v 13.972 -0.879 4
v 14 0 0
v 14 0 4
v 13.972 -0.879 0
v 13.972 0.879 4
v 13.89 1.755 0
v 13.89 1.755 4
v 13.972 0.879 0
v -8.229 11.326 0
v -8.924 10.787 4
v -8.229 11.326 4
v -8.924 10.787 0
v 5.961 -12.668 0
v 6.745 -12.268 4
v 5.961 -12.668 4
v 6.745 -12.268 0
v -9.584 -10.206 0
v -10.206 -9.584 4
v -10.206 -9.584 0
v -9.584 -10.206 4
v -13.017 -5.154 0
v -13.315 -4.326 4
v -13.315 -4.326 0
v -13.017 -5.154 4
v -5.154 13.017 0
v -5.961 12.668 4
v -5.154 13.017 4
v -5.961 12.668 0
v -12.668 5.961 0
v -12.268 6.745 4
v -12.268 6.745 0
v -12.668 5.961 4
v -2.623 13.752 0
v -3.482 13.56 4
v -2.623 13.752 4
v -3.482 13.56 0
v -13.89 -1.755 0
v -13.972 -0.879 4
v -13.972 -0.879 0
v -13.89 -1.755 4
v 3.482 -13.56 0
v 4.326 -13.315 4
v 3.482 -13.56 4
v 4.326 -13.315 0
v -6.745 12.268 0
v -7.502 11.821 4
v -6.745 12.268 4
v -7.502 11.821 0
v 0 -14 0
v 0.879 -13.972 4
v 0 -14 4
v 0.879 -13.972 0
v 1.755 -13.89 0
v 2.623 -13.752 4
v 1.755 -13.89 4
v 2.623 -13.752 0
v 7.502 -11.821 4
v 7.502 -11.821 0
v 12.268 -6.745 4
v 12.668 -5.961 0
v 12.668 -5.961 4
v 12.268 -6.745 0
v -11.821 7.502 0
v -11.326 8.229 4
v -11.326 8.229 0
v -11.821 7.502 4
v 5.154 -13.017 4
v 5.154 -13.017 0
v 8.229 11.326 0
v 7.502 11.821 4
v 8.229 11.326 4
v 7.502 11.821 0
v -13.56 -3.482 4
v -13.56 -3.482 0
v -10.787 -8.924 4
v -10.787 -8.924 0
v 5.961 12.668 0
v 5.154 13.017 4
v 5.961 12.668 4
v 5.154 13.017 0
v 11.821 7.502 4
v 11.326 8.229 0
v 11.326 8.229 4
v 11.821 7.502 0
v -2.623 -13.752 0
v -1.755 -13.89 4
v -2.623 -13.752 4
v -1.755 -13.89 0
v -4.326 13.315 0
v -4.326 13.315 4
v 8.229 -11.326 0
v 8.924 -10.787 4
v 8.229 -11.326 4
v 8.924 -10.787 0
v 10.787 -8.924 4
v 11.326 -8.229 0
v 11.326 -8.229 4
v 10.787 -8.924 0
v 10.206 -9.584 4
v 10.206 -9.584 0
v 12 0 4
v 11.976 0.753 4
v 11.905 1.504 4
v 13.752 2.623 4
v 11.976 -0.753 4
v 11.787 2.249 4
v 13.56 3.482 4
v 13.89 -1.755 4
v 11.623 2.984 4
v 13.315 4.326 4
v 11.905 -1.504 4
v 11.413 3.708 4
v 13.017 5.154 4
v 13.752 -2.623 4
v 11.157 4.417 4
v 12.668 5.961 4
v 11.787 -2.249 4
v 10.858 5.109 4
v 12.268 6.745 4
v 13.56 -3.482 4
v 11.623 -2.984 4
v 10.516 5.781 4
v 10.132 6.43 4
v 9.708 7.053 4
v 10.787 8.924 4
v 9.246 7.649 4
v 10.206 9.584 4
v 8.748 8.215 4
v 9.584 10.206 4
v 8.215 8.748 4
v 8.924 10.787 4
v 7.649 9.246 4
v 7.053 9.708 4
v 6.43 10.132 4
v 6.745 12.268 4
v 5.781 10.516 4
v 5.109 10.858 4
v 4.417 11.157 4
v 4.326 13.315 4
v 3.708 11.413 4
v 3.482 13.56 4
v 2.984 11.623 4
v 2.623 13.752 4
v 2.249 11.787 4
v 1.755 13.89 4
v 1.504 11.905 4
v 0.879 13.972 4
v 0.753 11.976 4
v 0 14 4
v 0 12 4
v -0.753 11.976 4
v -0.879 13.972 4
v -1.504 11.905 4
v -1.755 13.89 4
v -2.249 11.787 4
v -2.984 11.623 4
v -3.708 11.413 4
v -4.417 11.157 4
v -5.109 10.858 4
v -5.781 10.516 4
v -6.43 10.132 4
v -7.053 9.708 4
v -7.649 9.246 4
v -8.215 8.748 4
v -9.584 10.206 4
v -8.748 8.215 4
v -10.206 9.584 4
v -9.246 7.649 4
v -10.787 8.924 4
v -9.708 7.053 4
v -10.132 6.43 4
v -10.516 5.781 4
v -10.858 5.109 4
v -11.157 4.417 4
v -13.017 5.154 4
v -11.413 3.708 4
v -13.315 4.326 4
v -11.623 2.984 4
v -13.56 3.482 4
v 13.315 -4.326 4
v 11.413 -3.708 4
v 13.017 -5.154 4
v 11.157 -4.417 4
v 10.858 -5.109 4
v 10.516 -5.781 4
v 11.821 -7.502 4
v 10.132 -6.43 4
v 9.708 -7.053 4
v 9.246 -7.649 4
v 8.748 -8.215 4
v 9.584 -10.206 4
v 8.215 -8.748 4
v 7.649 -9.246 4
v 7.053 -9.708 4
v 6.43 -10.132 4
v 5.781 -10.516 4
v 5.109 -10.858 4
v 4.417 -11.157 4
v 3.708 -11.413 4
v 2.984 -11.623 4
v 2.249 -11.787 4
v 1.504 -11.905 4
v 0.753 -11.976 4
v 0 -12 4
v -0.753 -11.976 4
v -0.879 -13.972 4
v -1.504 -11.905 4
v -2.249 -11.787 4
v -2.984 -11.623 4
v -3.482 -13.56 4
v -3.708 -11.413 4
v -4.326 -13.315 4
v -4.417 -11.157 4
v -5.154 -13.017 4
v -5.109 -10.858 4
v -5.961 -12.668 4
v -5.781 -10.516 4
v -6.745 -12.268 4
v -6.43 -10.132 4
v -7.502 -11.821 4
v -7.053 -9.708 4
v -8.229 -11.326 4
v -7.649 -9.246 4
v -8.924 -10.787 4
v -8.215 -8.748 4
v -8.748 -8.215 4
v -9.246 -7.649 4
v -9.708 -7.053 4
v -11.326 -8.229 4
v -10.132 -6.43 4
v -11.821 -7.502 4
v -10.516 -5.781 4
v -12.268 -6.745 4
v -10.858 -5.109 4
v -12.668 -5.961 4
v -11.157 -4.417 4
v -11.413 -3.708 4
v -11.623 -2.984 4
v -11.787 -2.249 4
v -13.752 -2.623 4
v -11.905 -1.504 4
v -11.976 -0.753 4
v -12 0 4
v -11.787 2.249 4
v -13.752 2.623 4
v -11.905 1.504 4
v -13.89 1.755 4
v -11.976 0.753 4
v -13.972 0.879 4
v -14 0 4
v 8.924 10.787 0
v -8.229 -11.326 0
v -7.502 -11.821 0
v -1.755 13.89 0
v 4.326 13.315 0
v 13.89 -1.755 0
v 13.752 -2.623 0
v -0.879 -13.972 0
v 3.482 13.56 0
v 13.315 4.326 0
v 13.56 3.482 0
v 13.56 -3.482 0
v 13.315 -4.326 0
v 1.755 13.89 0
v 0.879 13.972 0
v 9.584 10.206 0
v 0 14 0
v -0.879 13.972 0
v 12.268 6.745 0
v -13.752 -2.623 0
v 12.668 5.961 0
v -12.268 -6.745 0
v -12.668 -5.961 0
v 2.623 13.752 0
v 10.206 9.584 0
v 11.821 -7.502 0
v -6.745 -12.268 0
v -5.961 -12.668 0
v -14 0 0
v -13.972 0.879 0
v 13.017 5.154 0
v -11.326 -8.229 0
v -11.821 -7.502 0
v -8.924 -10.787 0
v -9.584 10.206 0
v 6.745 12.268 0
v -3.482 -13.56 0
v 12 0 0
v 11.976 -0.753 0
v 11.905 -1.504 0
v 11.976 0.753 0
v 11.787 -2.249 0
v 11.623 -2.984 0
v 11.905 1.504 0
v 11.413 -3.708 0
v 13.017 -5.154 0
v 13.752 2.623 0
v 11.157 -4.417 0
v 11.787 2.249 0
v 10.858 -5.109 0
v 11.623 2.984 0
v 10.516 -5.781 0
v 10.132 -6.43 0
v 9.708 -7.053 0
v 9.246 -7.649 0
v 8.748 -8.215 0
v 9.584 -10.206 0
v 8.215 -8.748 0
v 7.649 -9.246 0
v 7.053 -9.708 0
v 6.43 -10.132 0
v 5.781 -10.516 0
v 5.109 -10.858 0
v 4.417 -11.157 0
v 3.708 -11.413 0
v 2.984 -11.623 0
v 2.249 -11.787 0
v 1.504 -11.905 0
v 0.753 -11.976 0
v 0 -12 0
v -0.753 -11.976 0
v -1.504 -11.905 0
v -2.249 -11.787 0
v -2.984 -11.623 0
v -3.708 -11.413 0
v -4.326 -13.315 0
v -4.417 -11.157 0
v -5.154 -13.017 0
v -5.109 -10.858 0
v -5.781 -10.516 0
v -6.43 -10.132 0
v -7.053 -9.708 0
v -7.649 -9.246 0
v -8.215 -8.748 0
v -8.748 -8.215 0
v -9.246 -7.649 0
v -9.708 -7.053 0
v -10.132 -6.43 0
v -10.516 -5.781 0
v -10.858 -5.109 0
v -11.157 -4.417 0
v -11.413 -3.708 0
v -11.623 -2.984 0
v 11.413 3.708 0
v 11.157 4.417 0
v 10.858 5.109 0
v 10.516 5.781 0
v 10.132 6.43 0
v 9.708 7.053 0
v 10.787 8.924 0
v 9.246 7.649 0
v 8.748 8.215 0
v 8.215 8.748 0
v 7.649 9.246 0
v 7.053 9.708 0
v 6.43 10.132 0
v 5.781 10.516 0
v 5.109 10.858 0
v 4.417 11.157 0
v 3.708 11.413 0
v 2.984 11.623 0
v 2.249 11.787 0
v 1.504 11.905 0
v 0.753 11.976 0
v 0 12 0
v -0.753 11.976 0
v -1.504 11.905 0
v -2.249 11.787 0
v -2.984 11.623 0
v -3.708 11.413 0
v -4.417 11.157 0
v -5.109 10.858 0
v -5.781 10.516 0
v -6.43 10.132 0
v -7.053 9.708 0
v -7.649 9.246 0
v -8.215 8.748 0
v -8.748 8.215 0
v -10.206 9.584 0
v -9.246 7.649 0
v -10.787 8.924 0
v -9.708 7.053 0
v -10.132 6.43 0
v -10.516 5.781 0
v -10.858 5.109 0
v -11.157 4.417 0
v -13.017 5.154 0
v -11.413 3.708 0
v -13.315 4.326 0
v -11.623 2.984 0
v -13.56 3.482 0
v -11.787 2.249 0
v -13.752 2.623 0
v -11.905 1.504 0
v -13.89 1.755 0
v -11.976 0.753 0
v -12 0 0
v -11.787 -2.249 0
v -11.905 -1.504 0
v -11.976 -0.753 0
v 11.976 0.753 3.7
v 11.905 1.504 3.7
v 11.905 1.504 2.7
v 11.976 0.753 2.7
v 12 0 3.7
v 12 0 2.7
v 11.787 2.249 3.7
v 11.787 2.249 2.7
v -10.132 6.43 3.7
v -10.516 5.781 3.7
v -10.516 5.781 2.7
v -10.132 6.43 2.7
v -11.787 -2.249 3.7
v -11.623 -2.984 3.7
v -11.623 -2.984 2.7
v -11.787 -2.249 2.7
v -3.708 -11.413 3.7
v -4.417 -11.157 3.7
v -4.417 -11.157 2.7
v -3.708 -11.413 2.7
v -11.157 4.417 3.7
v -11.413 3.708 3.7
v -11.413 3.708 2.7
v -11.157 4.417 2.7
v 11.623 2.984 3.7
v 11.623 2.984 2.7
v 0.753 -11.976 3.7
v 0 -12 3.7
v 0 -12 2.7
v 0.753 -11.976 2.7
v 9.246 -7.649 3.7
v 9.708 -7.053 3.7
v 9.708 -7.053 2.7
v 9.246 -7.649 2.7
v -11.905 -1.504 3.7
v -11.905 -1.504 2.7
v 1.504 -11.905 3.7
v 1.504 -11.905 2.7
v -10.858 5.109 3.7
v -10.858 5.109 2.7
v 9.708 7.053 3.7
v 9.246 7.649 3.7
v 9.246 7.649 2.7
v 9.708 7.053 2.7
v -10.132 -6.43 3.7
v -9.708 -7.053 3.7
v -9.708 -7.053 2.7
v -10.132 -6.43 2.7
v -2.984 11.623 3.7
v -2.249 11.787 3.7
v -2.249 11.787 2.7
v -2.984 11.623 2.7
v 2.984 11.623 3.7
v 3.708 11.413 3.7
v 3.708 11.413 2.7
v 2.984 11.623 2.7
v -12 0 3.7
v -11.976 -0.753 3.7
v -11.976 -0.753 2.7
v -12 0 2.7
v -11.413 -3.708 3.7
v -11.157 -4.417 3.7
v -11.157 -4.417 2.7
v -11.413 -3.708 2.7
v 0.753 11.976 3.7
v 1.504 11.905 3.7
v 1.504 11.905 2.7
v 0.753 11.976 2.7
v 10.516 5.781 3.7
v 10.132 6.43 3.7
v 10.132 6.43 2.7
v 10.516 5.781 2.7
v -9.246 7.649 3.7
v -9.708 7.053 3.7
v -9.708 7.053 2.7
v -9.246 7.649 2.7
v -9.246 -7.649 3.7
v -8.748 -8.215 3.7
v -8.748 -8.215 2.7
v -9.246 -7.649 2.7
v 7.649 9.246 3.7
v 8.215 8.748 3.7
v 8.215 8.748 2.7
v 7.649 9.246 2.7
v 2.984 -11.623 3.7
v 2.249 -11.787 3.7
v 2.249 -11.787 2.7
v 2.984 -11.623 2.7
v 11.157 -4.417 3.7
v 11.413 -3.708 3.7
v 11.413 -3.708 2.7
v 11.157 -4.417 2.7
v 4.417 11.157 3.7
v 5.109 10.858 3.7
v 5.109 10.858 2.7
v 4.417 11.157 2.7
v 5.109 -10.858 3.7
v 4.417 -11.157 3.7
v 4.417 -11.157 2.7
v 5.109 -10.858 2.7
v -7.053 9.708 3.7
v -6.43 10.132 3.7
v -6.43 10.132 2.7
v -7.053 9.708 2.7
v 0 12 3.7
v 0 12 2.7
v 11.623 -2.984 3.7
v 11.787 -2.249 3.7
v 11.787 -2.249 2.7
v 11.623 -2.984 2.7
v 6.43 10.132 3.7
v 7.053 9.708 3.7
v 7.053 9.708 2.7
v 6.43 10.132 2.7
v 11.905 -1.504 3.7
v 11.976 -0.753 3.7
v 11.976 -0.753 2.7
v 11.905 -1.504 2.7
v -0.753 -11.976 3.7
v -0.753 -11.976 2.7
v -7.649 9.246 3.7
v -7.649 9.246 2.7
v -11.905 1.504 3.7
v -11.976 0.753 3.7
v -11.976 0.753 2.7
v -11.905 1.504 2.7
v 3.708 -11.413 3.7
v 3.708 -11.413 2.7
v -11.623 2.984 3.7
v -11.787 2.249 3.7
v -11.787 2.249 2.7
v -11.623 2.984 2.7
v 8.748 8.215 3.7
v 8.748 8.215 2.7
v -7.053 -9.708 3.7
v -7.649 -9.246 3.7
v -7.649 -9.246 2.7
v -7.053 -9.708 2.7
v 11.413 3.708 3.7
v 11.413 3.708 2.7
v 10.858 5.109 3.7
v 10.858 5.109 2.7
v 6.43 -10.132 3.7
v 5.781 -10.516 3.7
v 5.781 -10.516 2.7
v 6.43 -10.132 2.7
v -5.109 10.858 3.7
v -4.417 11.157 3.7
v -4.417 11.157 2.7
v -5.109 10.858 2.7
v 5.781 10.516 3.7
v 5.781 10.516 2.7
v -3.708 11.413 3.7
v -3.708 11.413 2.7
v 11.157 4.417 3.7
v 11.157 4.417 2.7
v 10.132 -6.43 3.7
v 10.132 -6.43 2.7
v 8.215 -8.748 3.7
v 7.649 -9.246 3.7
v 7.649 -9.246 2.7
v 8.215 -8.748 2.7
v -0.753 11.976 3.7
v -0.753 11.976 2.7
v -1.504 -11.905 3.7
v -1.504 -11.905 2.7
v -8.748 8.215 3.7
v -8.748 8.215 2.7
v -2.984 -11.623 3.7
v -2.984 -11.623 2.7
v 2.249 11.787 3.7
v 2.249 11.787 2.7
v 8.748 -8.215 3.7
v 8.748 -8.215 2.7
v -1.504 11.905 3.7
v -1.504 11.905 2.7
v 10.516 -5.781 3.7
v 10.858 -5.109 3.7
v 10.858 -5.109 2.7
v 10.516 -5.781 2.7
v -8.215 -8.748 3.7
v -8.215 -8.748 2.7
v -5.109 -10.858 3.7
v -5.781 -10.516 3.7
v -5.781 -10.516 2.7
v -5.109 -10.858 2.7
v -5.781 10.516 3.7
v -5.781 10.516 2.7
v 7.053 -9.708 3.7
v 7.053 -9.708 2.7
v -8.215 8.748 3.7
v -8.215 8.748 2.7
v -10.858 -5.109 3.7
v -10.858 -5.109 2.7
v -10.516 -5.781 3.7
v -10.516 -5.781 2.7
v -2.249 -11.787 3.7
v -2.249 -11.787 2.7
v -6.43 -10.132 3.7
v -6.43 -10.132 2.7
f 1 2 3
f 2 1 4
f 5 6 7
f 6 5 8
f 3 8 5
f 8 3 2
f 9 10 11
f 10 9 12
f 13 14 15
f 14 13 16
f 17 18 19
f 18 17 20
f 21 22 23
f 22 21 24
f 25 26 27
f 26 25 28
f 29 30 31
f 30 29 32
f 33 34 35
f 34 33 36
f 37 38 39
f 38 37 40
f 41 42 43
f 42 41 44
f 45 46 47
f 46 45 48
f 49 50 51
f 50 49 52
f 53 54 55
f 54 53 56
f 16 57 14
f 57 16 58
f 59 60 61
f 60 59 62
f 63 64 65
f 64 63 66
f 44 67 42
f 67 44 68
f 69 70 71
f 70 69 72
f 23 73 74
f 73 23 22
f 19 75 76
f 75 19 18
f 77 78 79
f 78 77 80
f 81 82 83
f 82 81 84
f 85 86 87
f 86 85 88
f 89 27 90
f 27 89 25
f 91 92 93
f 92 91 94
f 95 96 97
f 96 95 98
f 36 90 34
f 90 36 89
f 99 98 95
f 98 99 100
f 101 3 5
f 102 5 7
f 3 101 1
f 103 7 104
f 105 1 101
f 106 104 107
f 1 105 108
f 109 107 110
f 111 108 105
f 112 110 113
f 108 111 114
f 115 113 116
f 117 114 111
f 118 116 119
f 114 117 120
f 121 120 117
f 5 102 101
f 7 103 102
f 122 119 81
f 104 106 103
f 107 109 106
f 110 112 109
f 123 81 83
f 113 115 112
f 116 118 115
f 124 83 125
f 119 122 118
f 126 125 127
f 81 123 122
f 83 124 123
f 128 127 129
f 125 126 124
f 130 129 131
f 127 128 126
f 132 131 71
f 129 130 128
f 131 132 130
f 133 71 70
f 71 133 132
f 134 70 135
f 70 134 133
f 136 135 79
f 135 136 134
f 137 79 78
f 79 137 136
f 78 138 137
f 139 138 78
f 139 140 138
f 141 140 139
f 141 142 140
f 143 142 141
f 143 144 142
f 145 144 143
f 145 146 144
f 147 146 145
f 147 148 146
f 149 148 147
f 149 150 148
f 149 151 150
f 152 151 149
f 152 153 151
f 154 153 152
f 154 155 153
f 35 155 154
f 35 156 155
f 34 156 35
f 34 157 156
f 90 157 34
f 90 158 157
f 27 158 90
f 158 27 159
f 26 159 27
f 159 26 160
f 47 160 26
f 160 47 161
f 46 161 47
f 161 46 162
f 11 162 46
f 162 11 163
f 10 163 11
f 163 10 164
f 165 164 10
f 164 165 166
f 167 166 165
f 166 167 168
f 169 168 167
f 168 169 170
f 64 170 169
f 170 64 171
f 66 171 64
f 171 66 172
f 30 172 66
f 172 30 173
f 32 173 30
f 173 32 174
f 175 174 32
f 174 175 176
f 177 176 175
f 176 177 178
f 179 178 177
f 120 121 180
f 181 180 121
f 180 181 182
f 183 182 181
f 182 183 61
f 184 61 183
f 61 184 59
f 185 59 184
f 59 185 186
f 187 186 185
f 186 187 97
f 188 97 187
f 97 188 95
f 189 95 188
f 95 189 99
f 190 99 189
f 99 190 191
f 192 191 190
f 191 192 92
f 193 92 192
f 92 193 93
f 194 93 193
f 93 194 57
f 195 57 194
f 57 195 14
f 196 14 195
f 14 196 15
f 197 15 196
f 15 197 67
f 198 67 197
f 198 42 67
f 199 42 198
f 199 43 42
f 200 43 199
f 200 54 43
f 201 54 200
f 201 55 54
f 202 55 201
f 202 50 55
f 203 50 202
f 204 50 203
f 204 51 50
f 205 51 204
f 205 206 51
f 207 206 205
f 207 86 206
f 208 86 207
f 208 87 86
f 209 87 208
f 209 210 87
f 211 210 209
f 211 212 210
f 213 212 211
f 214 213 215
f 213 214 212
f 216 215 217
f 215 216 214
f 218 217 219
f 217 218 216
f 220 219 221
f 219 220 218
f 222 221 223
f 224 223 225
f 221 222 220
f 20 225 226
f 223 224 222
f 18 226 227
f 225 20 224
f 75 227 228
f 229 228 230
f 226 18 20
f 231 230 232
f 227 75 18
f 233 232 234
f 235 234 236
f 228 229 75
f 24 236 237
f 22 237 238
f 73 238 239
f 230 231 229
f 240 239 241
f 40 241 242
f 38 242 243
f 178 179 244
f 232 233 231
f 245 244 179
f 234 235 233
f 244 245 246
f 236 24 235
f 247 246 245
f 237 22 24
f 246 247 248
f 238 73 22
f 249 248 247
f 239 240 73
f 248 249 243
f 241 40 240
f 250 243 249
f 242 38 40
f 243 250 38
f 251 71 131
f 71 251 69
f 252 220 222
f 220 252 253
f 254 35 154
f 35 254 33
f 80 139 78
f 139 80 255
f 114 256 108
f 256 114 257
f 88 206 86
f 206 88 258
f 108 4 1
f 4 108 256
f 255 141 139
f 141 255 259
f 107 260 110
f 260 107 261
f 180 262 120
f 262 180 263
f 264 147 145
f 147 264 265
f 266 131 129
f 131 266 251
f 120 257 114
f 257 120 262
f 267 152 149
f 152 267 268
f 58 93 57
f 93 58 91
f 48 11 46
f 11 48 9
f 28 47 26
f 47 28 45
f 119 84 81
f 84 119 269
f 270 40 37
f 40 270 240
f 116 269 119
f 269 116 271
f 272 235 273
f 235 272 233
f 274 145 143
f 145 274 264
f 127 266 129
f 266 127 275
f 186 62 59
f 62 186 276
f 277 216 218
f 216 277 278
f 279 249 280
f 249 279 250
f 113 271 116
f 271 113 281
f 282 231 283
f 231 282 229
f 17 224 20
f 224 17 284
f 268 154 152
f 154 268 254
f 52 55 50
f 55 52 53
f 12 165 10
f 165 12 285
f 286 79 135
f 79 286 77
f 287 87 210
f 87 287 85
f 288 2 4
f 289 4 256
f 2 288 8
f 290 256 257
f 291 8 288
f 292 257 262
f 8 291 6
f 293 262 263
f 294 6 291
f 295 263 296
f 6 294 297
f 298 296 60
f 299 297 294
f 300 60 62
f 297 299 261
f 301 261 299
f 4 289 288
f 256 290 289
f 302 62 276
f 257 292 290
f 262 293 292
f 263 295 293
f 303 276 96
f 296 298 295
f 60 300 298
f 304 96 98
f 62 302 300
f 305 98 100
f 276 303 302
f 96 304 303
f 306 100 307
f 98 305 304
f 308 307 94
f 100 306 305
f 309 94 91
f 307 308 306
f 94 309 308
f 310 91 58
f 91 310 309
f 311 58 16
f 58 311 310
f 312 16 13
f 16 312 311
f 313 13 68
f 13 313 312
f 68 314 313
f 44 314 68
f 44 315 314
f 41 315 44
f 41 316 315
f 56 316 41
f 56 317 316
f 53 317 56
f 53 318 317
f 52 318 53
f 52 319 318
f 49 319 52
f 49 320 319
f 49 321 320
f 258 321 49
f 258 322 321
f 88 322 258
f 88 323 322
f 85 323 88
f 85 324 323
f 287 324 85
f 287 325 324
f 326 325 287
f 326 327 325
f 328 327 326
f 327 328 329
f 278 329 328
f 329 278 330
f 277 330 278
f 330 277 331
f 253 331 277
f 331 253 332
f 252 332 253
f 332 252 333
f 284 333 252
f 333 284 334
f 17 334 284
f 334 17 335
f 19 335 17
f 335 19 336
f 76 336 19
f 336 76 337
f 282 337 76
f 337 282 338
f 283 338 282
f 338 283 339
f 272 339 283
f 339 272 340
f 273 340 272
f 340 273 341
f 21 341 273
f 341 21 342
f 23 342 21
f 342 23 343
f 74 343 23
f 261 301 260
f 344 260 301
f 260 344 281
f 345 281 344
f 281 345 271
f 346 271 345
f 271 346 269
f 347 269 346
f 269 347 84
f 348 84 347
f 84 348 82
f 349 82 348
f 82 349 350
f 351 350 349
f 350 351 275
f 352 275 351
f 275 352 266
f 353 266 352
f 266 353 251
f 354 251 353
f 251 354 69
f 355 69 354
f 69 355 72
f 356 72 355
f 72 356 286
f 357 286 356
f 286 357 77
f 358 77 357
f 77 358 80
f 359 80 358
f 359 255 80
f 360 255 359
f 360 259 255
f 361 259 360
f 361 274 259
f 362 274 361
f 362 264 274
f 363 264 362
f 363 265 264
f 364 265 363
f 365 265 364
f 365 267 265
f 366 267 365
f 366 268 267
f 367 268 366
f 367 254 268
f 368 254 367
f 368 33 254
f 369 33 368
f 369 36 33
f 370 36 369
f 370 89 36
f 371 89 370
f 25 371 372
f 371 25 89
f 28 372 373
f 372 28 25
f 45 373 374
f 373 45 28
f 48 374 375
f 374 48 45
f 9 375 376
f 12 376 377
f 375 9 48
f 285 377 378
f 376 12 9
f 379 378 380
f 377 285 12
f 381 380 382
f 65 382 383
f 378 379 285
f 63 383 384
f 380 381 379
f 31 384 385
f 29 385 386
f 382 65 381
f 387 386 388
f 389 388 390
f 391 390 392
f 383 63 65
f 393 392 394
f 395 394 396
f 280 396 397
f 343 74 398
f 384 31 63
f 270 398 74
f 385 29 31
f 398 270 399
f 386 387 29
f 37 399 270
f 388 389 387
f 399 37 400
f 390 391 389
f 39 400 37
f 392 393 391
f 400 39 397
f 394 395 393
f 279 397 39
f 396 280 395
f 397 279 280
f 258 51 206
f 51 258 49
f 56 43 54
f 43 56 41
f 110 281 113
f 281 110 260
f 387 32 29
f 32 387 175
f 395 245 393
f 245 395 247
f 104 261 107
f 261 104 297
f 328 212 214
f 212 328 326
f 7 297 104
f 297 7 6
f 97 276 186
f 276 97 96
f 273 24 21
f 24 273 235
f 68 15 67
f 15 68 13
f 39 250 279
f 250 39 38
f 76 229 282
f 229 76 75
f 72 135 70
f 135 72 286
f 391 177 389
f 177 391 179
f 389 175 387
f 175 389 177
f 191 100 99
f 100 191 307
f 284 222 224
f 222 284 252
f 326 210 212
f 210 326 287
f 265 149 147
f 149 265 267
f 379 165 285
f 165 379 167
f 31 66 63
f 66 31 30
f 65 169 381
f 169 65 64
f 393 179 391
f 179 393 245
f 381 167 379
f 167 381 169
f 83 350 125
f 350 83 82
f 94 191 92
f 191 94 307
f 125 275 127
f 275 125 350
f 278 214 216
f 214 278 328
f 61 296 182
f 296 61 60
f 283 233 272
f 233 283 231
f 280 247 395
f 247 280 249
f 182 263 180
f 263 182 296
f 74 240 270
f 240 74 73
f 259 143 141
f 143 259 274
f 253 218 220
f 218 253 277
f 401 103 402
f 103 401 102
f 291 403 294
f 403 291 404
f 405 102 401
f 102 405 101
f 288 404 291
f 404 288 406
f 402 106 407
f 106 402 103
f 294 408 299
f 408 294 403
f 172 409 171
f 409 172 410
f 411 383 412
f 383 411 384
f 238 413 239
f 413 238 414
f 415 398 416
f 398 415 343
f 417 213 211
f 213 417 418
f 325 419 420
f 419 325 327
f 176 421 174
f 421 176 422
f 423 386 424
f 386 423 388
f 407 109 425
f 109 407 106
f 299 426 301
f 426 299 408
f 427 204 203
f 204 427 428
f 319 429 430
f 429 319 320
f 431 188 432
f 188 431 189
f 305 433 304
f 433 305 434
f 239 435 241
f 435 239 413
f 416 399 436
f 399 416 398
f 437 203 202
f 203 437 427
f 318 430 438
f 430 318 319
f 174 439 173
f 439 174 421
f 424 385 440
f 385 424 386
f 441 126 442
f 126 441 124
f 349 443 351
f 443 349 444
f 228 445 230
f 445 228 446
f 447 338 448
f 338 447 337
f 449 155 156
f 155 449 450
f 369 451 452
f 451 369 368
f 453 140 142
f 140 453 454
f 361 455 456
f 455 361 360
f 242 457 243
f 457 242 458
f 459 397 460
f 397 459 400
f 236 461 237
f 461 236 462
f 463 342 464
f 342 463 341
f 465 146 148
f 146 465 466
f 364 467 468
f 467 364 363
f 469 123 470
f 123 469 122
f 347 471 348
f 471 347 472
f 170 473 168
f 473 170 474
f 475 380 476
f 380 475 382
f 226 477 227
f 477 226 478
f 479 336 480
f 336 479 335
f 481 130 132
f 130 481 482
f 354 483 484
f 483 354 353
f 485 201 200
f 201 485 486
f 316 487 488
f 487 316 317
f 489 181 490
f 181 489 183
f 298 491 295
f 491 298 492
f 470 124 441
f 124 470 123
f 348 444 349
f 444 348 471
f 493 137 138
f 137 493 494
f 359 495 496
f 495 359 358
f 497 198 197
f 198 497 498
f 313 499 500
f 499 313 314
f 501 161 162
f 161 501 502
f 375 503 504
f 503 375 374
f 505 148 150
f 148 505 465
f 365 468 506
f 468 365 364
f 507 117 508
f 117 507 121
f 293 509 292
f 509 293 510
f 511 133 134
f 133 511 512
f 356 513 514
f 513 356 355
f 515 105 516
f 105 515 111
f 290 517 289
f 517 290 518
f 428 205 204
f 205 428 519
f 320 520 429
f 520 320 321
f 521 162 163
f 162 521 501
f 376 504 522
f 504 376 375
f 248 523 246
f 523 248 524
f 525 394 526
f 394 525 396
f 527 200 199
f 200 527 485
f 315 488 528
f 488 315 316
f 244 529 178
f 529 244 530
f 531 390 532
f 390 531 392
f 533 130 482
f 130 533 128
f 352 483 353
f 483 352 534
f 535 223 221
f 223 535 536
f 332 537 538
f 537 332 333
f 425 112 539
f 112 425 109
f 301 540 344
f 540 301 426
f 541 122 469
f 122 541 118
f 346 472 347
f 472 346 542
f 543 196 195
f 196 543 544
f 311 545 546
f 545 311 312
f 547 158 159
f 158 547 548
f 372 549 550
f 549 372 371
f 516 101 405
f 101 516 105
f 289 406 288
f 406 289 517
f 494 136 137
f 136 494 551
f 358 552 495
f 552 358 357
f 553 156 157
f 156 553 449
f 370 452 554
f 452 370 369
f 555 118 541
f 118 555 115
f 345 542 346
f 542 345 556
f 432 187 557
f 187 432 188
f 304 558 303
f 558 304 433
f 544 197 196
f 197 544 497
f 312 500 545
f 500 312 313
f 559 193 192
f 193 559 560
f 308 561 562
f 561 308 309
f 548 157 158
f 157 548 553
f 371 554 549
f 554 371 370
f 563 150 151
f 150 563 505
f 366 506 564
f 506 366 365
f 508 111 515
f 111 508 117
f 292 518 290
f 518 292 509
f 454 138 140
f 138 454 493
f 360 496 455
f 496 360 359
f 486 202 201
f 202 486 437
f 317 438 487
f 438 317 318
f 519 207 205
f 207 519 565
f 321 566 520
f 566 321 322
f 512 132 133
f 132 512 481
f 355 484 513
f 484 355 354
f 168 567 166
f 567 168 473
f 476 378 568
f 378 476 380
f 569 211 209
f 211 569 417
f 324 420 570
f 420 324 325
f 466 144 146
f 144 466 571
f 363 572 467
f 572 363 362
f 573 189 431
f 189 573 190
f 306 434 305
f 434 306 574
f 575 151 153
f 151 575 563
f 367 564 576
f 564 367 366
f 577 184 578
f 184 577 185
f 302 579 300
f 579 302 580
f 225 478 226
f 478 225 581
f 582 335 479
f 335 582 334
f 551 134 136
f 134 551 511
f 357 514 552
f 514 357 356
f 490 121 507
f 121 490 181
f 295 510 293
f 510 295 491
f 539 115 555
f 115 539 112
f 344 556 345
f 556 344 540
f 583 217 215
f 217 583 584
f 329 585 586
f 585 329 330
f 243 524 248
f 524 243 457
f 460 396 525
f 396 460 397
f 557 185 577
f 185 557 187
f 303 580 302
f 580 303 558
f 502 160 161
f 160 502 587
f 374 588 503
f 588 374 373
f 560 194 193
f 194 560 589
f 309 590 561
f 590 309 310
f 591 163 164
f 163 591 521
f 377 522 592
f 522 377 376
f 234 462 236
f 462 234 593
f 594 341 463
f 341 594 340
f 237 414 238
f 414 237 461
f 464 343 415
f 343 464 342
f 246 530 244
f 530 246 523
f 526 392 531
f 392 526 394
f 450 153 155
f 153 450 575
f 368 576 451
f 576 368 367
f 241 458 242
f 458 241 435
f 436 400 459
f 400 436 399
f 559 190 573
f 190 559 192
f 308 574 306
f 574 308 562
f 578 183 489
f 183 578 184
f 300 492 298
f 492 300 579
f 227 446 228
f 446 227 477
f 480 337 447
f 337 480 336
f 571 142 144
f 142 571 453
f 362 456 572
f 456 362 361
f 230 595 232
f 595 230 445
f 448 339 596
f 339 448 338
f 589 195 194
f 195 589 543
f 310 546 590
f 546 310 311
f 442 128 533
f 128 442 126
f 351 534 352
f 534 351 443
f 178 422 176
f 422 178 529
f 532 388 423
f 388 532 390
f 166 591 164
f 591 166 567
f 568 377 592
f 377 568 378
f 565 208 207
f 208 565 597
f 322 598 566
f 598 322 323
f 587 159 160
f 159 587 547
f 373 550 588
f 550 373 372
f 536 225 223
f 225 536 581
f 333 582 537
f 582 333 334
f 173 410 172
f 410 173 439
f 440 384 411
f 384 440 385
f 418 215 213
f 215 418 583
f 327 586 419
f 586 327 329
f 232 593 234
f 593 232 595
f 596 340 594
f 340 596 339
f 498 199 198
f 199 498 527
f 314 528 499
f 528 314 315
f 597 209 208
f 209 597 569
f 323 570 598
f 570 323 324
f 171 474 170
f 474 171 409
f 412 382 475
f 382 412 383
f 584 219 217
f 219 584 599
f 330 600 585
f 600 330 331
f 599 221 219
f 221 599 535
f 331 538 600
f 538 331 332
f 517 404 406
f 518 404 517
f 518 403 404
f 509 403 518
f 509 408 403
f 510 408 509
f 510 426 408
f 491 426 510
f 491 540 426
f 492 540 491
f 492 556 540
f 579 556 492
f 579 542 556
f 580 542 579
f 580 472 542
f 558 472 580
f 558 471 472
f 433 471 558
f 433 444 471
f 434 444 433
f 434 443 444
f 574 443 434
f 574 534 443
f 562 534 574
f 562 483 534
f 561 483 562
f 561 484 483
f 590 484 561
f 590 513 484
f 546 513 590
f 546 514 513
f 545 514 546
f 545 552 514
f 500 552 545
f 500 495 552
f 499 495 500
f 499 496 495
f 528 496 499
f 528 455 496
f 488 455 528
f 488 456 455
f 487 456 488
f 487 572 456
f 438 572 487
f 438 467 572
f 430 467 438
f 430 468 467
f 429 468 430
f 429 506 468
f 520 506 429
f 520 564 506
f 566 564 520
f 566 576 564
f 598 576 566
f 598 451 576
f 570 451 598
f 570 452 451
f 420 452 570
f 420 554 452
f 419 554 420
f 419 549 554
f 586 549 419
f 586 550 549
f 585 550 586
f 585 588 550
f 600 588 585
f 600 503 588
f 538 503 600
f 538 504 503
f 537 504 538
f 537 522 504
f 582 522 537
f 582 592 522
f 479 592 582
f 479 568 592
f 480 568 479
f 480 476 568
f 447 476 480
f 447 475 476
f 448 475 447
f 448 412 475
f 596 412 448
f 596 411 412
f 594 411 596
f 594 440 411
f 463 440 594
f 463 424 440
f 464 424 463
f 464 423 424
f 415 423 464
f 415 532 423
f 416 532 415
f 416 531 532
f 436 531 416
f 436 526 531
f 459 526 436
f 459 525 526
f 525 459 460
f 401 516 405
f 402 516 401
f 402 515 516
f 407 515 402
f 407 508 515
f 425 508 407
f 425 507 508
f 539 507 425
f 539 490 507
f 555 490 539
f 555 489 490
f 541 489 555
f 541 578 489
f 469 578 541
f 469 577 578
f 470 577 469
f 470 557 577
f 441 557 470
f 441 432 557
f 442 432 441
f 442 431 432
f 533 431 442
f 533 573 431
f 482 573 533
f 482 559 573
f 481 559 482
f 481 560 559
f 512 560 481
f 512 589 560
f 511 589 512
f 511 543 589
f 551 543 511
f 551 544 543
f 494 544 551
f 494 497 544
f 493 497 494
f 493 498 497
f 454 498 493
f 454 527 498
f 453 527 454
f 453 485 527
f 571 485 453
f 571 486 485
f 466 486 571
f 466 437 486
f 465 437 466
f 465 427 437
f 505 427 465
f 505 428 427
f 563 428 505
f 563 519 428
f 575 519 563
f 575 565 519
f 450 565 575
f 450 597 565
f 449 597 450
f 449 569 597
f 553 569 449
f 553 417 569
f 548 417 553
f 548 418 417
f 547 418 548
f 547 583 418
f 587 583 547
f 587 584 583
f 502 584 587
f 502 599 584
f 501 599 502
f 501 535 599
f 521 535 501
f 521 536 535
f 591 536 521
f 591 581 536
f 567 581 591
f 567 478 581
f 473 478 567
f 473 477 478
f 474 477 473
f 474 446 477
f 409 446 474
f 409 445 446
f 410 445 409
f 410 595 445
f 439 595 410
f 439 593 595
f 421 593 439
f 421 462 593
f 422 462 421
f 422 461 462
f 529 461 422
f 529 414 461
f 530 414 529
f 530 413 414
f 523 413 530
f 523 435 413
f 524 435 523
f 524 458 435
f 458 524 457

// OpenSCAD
color("black", 1)
difference()
{
    cylinder(d=28, h=4, $fn=100);
    translate([0,0,-0.1])
    cylinder(d=24, h=4.5, $fn=100);
}

translate([0, 0, 2.7])
color("red", 0.3)
cylinder(d=25,h=1, $fn=100);
